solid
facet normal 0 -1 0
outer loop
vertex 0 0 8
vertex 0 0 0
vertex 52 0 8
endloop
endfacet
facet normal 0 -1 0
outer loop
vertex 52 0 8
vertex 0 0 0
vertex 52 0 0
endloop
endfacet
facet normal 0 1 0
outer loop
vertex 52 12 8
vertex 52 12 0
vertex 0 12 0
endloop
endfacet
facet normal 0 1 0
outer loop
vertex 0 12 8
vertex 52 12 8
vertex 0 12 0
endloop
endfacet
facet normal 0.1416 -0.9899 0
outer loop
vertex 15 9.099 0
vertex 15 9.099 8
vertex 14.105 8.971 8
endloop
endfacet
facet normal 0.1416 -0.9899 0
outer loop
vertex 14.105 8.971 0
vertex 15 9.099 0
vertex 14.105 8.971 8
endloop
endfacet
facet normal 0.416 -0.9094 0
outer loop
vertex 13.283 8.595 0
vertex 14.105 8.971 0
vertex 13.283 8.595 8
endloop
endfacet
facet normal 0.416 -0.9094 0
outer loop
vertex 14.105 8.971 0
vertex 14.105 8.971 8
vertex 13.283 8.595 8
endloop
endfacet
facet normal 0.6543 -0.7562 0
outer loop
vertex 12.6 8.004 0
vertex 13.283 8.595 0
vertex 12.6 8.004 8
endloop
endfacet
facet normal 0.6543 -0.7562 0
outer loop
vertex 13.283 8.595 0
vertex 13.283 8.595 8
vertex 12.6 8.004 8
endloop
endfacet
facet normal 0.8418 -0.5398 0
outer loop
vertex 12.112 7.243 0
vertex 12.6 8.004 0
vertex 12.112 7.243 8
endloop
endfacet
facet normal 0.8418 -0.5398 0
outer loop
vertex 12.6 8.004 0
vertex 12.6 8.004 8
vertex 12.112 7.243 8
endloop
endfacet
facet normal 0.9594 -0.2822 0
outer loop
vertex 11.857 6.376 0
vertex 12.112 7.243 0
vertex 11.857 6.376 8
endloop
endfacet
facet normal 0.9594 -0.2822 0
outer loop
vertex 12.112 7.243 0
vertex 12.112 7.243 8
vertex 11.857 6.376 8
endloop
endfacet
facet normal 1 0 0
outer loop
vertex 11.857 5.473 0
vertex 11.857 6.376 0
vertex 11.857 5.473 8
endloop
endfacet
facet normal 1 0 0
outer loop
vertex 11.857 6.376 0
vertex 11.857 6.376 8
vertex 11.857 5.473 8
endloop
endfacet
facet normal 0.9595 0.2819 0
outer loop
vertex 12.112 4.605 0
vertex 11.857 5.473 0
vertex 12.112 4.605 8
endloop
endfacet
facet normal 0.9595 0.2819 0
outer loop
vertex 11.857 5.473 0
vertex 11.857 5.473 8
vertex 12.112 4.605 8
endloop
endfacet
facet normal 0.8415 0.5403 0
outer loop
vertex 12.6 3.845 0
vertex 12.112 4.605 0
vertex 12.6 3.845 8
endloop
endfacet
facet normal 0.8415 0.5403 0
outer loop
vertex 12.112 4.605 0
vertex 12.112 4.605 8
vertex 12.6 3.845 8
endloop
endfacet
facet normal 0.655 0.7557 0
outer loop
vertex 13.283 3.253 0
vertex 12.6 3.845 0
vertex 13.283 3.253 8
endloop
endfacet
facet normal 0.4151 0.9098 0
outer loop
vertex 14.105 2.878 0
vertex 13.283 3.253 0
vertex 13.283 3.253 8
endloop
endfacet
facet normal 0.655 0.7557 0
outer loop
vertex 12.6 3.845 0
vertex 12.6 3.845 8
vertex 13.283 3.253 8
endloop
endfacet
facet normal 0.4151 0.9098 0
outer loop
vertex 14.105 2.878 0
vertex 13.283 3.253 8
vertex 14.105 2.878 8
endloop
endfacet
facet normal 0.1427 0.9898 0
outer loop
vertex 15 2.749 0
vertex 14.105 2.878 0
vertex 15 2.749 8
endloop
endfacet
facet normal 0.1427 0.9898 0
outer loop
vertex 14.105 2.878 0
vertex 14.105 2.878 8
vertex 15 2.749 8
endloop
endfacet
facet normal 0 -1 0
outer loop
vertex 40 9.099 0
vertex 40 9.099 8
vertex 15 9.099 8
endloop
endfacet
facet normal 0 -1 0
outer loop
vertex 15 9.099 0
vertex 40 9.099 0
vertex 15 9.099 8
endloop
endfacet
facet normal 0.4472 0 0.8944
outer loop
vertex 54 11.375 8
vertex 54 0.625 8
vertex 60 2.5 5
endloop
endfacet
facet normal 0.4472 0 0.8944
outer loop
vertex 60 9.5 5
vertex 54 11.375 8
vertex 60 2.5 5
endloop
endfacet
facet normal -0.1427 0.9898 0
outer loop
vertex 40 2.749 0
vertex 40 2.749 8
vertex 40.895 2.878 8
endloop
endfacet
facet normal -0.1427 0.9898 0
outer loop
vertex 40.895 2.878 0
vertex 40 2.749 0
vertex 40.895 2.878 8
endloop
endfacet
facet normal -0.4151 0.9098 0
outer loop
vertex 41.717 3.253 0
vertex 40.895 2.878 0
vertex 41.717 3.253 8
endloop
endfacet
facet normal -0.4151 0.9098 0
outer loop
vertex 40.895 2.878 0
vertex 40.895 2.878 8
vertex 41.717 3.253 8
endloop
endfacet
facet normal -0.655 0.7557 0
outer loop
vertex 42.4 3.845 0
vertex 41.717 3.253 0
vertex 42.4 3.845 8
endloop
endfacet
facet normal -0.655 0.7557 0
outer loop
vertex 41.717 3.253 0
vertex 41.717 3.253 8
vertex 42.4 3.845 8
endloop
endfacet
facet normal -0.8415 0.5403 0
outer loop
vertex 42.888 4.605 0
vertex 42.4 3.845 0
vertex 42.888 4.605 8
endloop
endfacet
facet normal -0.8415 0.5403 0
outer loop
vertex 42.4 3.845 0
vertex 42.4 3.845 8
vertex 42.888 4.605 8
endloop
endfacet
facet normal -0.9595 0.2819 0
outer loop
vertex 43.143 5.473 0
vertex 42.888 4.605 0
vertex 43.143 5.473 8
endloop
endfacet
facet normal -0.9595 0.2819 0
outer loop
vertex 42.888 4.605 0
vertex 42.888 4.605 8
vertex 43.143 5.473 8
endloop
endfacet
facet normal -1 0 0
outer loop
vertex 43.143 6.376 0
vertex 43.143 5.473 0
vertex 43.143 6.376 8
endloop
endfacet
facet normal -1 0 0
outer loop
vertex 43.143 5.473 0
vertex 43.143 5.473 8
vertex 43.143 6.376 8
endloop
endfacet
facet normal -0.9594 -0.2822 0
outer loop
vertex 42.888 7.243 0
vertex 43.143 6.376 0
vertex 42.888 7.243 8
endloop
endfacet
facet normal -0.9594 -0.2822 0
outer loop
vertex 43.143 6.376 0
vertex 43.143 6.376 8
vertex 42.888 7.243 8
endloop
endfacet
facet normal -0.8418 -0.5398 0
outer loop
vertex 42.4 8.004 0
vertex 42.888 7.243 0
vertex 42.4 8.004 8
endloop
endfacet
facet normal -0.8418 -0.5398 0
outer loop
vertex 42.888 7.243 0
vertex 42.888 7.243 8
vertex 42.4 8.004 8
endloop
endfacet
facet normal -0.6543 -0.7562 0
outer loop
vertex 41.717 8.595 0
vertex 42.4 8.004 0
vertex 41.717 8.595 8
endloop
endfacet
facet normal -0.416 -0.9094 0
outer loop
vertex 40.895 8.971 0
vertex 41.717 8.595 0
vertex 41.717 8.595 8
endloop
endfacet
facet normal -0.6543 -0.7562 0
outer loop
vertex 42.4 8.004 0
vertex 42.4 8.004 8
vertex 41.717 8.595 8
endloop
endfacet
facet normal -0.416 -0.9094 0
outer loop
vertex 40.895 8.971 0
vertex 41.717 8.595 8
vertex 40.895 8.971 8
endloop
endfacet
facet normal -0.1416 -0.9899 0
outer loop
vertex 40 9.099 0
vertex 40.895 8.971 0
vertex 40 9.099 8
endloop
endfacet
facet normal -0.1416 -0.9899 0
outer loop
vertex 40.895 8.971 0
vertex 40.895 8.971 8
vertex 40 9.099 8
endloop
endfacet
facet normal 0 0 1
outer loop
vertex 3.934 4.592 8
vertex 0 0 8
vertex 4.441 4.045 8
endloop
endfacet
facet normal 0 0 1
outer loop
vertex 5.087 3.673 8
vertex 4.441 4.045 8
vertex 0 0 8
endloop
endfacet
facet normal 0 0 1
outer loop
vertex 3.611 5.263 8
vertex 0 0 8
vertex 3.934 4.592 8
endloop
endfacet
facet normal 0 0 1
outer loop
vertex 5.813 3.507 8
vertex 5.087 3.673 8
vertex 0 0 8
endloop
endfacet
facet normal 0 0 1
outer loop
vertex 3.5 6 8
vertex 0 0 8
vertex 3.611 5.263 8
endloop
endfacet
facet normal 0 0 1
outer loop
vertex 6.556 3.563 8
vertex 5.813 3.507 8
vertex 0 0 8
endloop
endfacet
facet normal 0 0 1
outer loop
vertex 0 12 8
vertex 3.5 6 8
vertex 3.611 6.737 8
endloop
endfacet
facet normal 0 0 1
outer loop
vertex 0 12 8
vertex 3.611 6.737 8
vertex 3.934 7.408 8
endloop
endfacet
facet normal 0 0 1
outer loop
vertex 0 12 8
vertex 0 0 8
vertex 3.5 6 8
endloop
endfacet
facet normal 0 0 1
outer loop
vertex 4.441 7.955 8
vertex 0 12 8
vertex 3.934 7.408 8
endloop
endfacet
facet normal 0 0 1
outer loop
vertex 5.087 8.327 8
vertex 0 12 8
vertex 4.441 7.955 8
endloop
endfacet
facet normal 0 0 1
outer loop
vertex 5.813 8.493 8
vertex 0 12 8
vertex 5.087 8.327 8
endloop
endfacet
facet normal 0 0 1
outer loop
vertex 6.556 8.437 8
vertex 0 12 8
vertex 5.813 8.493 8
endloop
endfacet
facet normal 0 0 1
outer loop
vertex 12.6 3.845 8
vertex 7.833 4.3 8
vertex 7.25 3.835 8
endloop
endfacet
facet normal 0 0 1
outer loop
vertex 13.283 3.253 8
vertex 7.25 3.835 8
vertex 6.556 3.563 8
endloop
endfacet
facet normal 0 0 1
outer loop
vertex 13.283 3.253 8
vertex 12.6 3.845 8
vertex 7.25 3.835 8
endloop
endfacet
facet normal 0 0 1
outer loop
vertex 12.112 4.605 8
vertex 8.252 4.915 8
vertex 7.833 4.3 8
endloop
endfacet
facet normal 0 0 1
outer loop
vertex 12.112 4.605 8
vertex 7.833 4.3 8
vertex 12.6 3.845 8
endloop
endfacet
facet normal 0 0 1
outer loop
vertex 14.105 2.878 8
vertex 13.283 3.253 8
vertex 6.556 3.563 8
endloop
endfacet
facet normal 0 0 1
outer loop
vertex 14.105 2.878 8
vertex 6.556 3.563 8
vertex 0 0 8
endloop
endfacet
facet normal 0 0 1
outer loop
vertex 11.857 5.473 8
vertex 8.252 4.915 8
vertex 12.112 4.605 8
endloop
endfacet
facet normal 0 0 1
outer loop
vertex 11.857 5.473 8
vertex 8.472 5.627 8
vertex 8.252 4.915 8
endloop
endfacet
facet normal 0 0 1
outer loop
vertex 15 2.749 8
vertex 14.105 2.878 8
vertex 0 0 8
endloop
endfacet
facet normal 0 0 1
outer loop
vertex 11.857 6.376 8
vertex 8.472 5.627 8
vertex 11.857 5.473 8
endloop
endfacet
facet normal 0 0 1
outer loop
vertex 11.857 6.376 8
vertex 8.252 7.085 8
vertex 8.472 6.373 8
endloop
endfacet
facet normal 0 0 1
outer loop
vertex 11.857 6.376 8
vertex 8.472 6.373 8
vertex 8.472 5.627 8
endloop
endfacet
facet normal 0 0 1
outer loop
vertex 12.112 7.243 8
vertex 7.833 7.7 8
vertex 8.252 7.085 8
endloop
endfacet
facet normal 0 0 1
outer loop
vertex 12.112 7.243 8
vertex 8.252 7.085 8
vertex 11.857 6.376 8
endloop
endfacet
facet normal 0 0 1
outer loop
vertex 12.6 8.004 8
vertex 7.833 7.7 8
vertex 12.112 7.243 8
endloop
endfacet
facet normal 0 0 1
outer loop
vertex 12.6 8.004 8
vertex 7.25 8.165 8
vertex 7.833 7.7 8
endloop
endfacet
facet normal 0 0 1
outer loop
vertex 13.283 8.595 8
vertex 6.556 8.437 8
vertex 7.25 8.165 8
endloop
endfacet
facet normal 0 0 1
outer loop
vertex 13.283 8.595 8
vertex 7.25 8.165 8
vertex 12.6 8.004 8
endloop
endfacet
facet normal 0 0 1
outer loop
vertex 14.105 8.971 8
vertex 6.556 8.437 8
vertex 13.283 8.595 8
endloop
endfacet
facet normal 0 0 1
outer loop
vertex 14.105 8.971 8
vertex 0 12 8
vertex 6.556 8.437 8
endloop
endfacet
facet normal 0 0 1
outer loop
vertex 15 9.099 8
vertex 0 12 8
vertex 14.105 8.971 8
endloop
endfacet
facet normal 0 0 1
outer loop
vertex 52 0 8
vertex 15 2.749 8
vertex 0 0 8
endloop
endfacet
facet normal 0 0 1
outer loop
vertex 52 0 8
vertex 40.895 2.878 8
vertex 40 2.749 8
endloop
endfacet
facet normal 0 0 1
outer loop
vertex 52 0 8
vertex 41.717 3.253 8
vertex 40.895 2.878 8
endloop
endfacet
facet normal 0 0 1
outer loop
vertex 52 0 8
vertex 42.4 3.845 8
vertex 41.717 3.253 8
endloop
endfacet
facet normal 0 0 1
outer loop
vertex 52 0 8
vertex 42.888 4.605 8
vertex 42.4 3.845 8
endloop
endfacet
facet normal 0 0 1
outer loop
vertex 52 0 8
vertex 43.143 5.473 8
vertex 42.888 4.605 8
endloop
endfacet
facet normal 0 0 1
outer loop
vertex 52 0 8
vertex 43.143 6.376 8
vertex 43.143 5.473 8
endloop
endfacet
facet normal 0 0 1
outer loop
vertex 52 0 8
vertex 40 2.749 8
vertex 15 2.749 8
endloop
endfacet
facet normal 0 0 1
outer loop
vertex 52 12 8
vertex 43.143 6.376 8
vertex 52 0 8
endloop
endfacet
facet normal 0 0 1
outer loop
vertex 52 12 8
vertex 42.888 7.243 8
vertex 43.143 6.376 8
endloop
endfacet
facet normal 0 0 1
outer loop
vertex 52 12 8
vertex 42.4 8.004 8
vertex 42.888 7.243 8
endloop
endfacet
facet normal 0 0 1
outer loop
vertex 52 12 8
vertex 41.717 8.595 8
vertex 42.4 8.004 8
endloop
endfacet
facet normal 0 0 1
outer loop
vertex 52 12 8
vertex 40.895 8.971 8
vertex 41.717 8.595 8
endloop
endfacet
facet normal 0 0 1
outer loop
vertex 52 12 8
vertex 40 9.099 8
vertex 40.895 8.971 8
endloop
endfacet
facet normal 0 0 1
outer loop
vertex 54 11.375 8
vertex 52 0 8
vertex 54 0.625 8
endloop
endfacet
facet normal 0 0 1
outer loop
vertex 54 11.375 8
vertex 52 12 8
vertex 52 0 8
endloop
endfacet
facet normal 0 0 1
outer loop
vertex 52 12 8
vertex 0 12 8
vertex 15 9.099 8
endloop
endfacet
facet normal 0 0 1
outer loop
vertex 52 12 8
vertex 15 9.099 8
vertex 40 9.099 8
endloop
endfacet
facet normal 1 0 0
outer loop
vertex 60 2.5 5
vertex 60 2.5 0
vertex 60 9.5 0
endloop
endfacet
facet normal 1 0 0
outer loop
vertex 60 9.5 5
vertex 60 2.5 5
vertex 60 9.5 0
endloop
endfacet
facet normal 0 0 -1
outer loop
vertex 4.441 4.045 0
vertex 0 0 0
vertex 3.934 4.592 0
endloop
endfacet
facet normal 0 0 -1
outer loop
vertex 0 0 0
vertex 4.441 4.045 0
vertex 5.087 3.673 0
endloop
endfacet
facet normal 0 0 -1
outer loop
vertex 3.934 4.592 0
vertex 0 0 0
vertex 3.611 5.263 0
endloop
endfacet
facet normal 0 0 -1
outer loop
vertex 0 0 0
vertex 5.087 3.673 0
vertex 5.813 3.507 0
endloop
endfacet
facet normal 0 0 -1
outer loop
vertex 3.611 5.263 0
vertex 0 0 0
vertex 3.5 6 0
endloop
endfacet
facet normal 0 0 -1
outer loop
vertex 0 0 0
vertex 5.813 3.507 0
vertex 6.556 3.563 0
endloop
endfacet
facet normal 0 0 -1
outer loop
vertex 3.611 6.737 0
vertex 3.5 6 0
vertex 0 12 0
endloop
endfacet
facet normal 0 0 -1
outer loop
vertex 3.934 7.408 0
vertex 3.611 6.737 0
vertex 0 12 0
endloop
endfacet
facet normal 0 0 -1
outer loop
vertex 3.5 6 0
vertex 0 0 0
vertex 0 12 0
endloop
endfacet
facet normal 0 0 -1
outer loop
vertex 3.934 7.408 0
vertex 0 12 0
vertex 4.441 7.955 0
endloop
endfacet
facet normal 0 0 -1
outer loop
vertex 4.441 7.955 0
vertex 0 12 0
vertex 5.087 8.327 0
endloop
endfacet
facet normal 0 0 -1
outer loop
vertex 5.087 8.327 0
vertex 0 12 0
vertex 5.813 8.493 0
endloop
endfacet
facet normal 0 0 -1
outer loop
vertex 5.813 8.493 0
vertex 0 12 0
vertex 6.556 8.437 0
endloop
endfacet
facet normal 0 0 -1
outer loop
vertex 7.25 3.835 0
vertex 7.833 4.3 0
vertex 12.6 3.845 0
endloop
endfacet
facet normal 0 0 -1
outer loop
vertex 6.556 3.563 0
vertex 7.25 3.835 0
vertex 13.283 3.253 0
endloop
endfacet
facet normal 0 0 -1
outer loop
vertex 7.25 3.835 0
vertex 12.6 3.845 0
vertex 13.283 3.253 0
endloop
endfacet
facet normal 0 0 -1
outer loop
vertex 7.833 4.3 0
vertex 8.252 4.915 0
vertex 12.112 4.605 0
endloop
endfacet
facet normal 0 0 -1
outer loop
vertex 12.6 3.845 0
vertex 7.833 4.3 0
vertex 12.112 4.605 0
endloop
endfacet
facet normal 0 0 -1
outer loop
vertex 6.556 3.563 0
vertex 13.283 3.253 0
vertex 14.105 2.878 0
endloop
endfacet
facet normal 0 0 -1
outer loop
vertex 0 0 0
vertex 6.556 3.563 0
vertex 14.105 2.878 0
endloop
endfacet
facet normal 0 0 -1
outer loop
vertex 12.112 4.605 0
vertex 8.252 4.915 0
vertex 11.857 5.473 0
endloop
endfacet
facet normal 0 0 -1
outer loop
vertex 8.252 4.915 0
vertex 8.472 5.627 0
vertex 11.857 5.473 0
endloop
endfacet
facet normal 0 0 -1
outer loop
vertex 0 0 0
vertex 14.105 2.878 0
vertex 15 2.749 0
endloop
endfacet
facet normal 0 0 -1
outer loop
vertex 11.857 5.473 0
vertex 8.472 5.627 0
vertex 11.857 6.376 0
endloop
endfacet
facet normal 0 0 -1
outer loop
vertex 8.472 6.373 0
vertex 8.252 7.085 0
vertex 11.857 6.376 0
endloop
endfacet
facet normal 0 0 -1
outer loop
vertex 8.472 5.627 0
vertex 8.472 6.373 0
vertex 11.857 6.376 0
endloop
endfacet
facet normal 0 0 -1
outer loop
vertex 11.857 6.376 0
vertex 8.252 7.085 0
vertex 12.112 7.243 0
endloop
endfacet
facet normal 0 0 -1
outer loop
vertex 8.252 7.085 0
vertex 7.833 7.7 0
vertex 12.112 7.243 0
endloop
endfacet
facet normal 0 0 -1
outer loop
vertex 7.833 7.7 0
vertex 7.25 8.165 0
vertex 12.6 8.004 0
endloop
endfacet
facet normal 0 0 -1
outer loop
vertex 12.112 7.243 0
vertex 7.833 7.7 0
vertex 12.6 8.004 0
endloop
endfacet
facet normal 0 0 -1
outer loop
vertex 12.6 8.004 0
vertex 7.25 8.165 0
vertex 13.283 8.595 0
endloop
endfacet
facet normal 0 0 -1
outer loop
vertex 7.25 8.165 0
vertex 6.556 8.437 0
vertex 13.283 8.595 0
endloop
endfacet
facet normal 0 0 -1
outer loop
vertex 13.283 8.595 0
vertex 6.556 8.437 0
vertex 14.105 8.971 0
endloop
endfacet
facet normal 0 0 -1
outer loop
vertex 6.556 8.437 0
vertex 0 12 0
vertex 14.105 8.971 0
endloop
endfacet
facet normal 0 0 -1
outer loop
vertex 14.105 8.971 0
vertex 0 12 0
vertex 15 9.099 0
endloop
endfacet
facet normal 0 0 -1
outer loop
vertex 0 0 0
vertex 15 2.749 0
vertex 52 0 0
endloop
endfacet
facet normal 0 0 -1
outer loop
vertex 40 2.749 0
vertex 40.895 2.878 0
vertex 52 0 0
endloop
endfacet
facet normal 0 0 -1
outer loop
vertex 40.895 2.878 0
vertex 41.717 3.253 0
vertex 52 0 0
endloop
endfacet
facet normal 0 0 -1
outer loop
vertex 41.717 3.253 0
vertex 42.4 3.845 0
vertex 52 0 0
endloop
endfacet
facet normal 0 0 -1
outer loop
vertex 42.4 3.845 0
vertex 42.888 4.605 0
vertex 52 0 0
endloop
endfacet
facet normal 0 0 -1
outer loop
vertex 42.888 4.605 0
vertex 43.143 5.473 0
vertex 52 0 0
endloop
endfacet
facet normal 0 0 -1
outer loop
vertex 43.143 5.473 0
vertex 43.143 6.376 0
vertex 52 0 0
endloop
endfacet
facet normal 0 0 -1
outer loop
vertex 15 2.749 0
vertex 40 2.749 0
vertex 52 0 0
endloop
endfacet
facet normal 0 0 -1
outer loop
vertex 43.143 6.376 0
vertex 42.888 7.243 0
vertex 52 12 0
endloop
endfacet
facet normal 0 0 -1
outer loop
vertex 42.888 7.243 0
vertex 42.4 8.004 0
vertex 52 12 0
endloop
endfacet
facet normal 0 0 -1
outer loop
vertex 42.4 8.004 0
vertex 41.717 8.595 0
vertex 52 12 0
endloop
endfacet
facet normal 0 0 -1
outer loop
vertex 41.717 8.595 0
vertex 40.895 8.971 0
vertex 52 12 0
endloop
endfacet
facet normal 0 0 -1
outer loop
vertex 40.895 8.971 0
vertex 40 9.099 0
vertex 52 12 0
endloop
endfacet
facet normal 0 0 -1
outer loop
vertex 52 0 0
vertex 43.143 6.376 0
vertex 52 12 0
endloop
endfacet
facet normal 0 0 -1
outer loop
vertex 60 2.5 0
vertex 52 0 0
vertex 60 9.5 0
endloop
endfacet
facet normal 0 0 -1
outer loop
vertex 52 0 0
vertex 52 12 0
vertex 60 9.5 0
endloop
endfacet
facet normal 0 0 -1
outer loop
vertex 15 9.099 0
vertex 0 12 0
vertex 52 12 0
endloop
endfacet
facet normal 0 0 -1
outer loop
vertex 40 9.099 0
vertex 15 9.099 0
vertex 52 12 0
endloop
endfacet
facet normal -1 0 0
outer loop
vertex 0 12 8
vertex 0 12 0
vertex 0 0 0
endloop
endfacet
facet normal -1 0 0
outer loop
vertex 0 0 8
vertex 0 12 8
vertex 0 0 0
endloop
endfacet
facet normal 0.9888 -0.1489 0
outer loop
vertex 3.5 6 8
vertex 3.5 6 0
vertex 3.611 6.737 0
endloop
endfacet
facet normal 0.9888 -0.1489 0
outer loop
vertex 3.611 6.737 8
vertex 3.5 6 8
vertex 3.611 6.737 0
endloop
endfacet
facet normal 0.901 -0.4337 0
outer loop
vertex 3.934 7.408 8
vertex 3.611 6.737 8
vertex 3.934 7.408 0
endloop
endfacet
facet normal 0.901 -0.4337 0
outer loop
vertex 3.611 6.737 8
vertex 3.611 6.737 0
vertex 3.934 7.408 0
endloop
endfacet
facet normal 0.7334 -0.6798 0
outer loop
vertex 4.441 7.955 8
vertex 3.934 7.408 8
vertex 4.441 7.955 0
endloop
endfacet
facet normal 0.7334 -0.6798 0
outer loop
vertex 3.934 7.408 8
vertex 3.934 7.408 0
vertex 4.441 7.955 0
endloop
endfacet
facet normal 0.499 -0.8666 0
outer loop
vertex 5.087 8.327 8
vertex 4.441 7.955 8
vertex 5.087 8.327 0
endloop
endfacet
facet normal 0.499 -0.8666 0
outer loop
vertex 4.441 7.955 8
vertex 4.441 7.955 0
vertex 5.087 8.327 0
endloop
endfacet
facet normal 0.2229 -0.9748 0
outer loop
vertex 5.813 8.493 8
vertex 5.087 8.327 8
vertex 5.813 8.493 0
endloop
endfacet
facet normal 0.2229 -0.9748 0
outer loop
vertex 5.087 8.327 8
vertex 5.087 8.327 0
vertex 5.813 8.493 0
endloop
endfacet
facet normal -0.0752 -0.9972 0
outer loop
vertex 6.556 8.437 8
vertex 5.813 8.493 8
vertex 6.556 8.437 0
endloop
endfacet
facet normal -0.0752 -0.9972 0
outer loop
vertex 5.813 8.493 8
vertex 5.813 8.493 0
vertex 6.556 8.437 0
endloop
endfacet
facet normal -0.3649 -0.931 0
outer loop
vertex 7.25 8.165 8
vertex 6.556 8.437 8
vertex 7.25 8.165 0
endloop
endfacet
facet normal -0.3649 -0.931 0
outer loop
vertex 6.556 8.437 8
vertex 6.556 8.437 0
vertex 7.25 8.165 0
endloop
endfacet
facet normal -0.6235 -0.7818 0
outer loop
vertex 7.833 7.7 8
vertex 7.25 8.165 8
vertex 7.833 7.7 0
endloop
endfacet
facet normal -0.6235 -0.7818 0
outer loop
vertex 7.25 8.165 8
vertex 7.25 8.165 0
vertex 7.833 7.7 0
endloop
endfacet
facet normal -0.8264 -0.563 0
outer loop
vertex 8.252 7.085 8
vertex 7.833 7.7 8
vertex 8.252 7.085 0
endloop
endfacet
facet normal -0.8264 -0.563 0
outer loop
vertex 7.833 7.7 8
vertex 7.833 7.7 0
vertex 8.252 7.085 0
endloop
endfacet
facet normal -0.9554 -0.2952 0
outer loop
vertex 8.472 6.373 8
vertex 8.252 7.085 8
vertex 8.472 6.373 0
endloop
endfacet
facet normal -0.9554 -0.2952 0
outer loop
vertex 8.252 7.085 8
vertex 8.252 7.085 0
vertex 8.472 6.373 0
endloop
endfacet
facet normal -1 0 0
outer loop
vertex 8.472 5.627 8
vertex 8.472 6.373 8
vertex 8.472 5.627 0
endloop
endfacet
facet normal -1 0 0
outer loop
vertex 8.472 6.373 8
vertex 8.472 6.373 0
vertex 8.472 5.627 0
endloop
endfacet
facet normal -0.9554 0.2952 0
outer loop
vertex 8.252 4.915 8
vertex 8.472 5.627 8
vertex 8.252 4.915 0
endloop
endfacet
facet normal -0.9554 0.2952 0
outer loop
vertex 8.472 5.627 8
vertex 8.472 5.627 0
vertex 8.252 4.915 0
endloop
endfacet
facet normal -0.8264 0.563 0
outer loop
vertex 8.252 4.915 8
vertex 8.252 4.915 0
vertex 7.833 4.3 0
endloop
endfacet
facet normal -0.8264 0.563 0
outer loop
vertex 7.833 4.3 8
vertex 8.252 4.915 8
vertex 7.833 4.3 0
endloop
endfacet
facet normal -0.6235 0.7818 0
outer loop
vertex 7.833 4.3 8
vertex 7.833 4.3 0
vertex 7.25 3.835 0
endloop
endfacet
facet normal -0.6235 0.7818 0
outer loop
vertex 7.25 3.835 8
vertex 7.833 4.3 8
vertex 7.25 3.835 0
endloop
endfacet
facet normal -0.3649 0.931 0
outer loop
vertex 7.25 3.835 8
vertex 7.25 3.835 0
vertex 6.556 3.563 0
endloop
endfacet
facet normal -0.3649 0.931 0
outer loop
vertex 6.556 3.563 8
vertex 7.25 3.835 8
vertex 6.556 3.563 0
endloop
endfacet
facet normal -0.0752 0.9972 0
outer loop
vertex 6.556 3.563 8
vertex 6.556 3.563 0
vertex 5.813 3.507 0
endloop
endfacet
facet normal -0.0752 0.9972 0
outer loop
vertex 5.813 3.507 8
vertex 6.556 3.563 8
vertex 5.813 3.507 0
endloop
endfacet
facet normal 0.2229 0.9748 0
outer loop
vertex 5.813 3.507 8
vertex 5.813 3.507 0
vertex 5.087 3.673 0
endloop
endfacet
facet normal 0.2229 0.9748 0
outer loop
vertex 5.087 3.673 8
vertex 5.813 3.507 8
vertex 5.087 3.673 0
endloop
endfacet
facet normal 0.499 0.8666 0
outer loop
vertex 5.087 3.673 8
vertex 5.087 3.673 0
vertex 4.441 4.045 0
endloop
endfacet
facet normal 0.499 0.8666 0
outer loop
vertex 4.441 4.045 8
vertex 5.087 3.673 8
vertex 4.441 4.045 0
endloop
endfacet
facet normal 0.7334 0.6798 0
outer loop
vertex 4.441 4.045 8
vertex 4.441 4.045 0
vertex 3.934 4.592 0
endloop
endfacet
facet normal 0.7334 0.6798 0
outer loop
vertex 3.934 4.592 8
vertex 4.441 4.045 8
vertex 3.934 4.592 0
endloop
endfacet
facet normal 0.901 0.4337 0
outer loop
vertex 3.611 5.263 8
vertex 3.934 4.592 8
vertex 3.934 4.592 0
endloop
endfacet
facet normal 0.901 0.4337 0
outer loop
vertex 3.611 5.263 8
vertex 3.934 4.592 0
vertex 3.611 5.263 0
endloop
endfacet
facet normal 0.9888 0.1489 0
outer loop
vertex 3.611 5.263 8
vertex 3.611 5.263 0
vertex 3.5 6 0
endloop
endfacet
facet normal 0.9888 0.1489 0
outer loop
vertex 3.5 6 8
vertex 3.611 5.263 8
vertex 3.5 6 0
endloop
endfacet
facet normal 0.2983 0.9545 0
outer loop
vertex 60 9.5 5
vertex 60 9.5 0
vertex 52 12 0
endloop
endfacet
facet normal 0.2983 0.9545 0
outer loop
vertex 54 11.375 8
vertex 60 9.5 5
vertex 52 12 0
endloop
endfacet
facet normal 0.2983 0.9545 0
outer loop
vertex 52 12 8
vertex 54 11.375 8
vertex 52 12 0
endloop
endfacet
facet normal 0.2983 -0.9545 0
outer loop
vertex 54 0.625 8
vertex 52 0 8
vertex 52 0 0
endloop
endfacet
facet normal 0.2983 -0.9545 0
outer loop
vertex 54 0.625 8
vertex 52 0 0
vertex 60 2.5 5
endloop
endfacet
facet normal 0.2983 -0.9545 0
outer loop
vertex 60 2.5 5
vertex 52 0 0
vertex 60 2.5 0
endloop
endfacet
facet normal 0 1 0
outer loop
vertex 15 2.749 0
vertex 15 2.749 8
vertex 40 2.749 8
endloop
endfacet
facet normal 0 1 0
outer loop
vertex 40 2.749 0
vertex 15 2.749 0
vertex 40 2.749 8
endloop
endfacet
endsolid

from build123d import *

# Parameters (mm, degrees)
F1_DEPTH = 8
F3_D     = 5
F5_DEPTH = 8.001
F7_DEPTH = 12.001


with BuildPart() as f1:
    # F0 (on Top) → F1 (new body)
    with BuildSketch(Plane.XY):
        Polygon((0, 12), (0, 0), (52, 0), (60, 2.5), (60, 9.5), (52, 12), align=None)
    extrude(amount=F1_DEPTH)

    # F3 (through all)
    with Locations(Plane.XY.offset(8)):
        with Locations((6, 6)):
            Hole(F3_D / 2)

    # F4 (on face) → F5 (cut, through all)
    with BuildSketch(Plane.XY.offset(8)):
        with BuildLine():
            ThreePointArc((15, 9.0993724681), (11.825, 5.9243724681), (15, 2.7493724681))
            Line((15, 2.7493724681), (40, 2.7493724681))
            ThreePointArc((40, 2.7493724681), (43.175, 5.9243724681), (40, 9.0993724681))
            Line((40, 9.0993724681), (15, 9.0993724681))
        make_face()
    extrude(amount=-F5_DEPTH, mode=Mode.SUBTRACT)

    # F6 (on face) → F7 (cut, through all)
    with BuildSketch(Plane.XZ):
        Polygon((60, 8), (54, 8), (60, 5), align=None)
    extrude(amount=-F7_DEPTH, mode=Mode.SUBTRACT)


solid = f1.part
